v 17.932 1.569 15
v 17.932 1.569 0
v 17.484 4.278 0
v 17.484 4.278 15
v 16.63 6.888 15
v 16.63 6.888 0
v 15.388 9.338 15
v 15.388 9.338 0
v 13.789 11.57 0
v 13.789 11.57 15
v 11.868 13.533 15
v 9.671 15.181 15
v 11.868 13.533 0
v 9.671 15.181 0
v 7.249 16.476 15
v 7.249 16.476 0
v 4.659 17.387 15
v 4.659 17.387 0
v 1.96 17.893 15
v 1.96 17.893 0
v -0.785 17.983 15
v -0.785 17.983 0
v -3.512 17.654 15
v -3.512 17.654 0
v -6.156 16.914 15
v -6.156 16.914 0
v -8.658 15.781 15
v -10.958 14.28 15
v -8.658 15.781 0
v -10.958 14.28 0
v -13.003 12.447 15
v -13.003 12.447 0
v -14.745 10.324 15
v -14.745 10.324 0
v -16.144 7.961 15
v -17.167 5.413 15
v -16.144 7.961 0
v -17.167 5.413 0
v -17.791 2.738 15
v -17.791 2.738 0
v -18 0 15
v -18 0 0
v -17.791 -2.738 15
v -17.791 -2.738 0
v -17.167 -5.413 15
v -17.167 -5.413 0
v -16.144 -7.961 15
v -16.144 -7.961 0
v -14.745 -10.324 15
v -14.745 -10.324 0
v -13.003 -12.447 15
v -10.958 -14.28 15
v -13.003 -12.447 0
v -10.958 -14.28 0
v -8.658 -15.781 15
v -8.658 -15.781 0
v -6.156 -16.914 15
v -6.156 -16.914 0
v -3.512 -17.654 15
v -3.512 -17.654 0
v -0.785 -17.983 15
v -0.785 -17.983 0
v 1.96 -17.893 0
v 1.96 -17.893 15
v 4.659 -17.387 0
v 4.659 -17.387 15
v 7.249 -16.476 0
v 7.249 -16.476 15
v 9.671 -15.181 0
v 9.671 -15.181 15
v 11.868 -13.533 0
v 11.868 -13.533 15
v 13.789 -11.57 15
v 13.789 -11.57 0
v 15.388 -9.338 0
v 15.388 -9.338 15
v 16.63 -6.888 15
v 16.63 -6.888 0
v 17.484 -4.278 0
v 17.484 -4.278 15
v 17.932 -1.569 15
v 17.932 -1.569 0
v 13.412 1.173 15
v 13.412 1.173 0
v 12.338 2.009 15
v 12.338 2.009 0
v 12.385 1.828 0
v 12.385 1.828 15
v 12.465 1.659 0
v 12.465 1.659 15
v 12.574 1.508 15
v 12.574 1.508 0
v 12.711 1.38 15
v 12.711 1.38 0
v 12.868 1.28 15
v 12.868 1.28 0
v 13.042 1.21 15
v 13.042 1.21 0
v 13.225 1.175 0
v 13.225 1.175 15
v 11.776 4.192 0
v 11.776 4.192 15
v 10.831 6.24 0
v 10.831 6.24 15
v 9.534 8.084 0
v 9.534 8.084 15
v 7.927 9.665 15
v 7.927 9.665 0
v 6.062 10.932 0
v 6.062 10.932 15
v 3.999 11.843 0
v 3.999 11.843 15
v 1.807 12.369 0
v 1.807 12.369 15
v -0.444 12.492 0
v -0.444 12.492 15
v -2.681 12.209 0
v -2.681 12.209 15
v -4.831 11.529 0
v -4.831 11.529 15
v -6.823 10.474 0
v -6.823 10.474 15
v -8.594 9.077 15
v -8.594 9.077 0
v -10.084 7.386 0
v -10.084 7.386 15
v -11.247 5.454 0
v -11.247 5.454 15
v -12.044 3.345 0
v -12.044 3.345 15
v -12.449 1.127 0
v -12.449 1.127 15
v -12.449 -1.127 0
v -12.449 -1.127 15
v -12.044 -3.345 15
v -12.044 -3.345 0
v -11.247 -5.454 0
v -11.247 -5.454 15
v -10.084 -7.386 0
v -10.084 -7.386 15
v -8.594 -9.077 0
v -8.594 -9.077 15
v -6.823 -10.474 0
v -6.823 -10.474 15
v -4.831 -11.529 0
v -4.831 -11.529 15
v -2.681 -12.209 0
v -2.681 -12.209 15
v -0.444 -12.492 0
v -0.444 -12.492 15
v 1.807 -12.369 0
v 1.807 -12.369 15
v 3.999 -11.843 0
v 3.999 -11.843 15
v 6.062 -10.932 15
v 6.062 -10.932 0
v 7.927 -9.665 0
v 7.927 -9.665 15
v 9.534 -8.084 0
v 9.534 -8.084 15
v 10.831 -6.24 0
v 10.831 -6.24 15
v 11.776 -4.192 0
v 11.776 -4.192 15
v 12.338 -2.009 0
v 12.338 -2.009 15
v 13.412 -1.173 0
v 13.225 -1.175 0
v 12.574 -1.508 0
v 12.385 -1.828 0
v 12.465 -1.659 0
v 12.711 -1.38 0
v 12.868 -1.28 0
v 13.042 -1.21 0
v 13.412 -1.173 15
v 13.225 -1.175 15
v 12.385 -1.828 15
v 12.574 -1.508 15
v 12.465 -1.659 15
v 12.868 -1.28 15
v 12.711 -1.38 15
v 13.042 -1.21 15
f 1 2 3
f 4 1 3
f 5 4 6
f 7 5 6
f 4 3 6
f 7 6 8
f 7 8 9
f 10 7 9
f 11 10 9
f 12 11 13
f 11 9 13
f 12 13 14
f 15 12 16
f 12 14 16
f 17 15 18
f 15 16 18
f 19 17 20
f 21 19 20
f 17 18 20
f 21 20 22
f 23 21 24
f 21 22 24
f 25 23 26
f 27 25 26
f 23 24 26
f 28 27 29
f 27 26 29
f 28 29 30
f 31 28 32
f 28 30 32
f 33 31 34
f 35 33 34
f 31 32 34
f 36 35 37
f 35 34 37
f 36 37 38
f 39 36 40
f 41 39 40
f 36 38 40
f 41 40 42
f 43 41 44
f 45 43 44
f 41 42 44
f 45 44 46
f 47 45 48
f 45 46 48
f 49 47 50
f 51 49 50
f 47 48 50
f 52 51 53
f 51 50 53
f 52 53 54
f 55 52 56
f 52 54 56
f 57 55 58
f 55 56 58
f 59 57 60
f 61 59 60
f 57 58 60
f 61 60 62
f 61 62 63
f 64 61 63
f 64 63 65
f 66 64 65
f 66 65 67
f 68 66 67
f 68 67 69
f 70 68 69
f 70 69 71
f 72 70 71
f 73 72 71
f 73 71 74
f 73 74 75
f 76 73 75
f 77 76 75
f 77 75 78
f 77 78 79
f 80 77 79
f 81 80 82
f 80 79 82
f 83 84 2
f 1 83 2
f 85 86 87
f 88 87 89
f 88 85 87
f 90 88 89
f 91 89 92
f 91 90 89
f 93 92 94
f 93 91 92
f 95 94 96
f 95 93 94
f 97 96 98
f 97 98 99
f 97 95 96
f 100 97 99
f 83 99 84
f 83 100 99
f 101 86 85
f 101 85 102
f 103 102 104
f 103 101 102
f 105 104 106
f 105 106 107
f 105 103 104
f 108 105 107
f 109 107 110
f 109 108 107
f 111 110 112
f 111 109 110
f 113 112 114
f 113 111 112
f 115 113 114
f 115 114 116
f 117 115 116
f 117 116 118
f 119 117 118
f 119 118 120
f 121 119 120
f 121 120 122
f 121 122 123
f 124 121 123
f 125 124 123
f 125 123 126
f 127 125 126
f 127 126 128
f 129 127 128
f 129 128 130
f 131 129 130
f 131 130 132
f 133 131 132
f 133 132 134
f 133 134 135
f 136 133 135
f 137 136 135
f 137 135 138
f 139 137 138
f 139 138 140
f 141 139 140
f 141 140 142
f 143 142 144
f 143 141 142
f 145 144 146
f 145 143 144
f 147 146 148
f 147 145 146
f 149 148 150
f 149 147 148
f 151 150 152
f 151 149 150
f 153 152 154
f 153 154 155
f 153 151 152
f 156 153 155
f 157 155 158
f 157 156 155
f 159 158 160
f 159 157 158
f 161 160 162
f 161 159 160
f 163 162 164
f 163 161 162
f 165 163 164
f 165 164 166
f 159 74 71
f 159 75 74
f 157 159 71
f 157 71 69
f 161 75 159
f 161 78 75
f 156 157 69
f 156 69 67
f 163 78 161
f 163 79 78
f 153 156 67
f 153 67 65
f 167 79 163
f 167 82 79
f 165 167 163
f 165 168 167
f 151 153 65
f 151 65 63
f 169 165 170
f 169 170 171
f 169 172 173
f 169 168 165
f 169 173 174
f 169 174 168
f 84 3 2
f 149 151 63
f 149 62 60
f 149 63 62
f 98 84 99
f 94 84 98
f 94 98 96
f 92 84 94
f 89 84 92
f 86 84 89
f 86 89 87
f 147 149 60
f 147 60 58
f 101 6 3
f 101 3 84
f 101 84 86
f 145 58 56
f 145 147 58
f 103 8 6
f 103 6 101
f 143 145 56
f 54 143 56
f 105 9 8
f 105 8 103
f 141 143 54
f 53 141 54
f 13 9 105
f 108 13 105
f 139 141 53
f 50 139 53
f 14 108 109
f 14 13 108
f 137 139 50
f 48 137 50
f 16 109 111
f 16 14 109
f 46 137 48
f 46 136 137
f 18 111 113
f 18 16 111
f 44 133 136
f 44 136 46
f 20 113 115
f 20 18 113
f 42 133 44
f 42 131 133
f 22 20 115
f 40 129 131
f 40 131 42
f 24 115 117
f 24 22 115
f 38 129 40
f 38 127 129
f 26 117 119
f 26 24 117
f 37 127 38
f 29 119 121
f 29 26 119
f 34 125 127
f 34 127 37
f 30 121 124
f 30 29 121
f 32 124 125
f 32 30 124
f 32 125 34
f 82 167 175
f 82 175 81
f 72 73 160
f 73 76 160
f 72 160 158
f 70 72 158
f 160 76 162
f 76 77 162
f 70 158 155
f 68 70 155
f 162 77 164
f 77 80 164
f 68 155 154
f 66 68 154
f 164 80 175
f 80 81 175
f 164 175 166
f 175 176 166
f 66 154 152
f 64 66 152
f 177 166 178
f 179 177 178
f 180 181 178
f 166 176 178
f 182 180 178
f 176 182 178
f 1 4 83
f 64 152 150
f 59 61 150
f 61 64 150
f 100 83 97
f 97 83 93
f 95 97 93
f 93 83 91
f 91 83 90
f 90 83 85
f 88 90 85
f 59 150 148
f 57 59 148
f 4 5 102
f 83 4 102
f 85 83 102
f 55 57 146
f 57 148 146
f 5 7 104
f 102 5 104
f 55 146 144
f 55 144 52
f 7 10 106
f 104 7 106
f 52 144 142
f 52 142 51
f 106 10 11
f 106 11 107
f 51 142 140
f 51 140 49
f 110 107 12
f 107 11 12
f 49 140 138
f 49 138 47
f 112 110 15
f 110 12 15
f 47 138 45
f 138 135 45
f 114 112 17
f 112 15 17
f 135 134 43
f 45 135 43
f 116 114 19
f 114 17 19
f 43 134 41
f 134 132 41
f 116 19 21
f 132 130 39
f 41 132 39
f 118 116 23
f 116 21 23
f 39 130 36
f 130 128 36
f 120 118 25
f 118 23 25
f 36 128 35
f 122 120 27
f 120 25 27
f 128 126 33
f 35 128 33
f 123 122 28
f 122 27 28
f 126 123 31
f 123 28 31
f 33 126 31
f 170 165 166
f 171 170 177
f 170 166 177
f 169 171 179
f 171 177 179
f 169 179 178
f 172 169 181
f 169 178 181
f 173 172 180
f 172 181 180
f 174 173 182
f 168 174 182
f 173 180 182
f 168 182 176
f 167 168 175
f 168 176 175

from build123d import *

# Parameters (mm, degrees)
PAD_DEPTH = 15
FILLET_R  = 1


with BuildPart() as part:
    # Sketch → Pad (new body)
    with BuildSketch(Plane.XY):
        with BuildLine():
            ThreePointArc((12.452434, 1.089447), (-12.5, 0), (12.452434, -1.089447))
            Line((12.452434, -1.089447), (17.931505, -1.568803))
            ThreePointArc((17.931505, 1.568803), (-18, 0), (17.931505, -1.568803))
            Line((12.452434, 1.089447), (17.931505, 1.568803))
        make_face()
    extrude(amount=PAD_DEPTH)

    # Fillet
    fillet_edges = [part.edges().sort_by_distance(p)[0] for p in [
        (12.452434, 1.089447, 7.5),
        (12.452434, -1.089447, 7.5),
    ]]
    fillet(fillet_edges, radius=FILLET_R)


solid = part.part
